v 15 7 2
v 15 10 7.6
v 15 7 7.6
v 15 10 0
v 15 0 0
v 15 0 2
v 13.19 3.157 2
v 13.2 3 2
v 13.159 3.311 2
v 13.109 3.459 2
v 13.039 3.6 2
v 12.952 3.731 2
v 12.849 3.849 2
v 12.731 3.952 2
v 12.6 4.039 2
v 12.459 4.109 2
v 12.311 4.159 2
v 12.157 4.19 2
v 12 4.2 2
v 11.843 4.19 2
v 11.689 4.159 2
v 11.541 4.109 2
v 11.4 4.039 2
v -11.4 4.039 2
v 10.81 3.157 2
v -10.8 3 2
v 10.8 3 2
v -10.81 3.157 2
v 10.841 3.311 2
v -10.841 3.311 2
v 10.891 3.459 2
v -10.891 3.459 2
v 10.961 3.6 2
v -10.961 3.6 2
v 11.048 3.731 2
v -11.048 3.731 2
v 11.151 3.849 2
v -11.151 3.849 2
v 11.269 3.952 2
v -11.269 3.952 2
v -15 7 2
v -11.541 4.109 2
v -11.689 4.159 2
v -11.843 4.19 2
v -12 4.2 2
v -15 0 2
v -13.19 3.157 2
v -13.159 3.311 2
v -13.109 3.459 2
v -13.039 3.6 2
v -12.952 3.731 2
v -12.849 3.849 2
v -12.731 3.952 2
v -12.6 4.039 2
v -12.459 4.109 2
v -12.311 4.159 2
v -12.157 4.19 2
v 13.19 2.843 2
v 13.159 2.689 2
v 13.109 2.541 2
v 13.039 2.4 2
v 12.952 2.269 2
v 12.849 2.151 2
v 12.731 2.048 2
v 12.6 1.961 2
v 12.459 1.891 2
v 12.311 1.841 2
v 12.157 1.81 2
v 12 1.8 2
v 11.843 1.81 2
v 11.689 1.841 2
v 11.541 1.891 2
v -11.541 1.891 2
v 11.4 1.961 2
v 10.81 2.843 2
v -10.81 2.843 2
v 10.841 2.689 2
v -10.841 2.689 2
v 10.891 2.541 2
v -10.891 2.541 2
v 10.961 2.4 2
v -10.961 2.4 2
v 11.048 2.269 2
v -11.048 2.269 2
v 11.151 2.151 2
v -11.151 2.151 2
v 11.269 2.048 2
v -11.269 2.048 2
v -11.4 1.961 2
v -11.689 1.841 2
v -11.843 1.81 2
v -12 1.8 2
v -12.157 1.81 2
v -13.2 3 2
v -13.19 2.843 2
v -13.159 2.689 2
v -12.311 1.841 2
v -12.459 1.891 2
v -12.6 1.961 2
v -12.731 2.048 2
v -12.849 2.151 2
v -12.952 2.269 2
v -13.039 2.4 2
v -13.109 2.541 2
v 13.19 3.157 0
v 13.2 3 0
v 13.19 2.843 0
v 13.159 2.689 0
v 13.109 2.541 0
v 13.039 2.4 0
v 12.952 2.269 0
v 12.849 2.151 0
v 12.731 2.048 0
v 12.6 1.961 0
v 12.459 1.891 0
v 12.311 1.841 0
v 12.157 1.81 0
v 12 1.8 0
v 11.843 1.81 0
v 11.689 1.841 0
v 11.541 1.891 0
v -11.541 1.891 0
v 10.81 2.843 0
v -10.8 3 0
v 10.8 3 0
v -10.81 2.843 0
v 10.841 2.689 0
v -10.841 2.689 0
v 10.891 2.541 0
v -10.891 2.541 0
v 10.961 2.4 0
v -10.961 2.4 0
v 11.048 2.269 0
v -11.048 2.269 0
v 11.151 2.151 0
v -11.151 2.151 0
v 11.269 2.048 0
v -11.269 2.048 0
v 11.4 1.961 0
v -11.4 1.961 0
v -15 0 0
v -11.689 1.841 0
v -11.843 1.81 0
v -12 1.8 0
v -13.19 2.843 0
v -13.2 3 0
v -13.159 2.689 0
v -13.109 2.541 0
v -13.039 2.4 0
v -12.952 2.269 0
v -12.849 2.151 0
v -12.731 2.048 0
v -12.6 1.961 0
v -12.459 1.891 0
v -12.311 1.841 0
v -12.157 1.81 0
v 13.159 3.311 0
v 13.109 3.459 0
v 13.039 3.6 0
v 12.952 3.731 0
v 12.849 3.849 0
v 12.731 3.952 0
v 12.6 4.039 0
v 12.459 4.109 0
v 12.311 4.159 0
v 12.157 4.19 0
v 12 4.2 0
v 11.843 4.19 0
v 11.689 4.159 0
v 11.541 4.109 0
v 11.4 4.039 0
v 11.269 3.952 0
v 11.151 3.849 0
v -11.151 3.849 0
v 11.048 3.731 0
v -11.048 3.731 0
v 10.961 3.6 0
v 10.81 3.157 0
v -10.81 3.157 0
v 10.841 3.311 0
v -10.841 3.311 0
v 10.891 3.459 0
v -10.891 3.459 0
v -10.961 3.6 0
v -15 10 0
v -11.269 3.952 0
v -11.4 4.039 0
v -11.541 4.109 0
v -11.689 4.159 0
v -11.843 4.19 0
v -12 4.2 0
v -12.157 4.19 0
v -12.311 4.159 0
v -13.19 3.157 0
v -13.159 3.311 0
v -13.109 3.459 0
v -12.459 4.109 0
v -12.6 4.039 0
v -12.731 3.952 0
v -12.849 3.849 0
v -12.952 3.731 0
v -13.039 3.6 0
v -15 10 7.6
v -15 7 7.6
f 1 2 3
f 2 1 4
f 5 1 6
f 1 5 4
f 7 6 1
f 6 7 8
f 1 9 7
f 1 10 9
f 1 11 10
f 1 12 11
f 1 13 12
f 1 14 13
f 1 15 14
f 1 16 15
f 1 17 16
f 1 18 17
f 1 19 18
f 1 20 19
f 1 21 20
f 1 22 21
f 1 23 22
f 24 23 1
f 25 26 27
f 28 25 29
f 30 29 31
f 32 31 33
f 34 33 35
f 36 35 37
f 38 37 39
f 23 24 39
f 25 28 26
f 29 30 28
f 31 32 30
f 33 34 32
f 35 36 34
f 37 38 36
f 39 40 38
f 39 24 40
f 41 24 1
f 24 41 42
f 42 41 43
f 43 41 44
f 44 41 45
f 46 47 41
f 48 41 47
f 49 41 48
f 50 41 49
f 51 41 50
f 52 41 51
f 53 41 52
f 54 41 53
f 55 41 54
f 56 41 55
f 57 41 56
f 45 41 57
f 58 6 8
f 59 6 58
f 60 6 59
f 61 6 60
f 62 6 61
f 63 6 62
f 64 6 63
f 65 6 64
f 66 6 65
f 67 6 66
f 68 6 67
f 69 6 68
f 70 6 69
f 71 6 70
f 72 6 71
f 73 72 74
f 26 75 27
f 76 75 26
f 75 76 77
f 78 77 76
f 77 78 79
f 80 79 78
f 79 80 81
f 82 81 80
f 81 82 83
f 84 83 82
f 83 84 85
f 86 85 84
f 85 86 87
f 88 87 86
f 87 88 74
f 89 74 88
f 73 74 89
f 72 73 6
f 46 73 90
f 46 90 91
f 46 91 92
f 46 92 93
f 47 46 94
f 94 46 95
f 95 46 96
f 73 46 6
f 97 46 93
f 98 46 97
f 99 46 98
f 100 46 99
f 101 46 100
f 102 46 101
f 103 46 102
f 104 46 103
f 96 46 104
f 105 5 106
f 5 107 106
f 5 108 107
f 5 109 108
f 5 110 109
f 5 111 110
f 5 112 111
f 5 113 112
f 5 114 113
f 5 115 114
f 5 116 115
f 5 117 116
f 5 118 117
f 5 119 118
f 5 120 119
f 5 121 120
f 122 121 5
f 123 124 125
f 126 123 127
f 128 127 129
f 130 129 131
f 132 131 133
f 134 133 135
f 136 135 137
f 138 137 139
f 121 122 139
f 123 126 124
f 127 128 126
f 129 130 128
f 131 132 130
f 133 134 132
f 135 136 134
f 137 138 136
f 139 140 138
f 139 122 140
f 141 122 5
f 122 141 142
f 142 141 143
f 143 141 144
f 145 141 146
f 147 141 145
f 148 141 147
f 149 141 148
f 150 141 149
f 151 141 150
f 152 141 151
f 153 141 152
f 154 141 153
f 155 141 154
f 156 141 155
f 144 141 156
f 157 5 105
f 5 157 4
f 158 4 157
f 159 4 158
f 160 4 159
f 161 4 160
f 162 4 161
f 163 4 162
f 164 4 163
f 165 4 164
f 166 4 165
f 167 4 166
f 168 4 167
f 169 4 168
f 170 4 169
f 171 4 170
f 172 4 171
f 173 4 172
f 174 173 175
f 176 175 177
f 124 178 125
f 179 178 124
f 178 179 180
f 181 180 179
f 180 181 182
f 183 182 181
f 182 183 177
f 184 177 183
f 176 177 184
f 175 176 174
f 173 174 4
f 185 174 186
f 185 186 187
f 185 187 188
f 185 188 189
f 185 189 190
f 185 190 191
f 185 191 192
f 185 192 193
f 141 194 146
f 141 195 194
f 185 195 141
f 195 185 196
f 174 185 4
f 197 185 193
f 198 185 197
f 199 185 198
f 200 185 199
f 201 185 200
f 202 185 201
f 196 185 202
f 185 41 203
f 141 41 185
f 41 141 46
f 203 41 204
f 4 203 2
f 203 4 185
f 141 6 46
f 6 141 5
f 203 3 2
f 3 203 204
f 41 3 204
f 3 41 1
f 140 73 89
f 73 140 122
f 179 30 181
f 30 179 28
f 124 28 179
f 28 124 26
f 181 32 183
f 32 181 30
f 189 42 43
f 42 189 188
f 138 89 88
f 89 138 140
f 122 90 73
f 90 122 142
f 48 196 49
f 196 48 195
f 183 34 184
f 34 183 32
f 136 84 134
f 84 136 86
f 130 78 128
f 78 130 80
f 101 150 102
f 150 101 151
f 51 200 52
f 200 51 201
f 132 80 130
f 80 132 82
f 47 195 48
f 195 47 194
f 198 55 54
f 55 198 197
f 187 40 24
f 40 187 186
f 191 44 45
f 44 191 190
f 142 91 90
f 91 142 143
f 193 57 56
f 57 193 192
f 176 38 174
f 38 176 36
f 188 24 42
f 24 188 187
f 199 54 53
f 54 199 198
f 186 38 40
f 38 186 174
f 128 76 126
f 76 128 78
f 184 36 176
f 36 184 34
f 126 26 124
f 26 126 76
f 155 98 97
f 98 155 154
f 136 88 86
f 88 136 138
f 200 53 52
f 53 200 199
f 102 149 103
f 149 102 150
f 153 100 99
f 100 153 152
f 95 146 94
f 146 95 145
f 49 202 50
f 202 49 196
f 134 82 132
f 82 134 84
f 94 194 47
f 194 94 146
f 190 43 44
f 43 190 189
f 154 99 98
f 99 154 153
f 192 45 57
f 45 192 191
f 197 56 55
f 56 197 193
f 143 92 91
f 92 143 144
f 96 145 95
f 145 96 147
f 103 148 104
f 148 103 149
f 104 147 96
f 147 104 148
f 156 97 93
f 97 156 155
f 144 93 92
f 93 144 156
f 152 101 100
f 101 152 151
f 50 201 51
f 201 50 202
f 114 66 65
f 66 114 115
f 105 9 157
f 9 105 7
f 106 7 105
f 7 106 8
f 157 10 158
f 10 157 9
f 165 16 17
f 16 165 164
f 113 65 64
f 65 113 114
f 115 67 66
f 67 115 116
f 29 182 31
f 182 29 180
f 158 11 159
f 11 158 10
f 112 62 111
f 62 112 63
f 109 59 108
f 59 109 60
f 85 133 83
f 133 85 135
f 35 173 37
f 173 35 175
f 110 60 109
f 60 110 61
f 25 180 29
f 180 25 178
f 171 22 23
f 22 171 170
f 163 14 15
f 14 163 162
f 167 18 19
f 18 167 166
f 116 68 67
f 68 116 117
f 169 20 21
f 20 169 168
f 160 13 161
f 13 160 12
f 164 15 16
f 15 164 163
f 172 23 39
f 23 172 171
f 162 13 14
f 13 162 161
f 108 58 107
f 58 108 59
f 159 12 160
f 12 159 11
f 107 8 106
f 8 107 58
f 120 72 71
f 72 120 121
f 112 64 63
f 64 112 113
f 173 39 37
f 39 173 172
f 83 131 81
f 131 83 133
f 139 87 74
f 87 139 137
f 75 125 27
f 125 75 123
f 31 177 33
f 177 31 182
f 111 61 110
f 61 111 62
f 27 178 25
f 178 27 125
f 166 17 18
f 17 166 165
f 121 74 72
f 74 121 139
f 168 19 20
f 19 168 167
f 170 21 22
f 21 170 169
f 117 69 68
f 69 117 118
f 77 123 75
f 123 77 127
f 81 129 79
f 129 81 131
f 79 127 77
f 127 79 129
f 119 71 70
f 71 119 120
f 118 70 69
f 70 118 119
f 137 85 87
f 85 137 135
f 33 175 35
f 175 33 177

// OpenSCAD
// file: params.scad
/*
 * params.scad — every dimension the printed parts share, in millimetres.
 * ======================================================================
 * Included by all cad/*.scad files. No dimension may be duplicated in a part
 * file; if two parts need the same number, it lives here.
 *
 * Values marked MEASURE are design targets until caliper measurements of a real
 * X240 top section replace them (issue #44). Everything else is a design choice.
 */

// ---------------------------------------------------------------- deck / case
case_width  = 309.0;   // MEASURE  X, left to right, at the deck's mating surface
case_depth  = 210.0;   // MEASURE  Y, front (palmrest) to back
wall_t      = 2.5;     // PETG shell wall
corner_r    = 3.0;     // MEASURE  outer corner radius
internal_h  = 18.0;    // floor-to-deck clearance (see docs/enclosure/integration.md)
case_h      = internal_h + wall_t;

// Screw bosses that meet the X240 deck, from the front-left corner.  MEASURE all.
deck_boss_positions = [
    [  8.0,   8.0 ], [ 60.0,   8.0 ], [150.0,   8.0 ], [250.0,   8.0 ], [301.0,   8.0 ],
    [  8.0, 202.0 ], [150.0, 202.0 ], [301.0, 202.0 ],
];
boss_od = 6.0;
boss_id = 3.2;         // M2 heat-set insert hole (insert OD ~3.2 for a 3.5 mm body)

// ---------------------------------------------------------------- split joint
split      = true;     // print as two halves (fits a 220 mm bed); false = one piece
split_x    = case_width / 2;
tab_count  = 3;        // dovetail tabs along the floor seam
tab_w      = 14.0;     // tab width at the seam
tab_flare  = 3.0;      // extra width at the tip (dovetail angle)
tab_len    = 10.0;     // how far the tab reaches into the other half
joint_gap  = 0.15;     // clearance per face; tune with a 30 mm coupon
pin_d      = 3.0;      // alignment pins through the front/rear walls
pin_len    = 10.0;

// ---------------------------------------------------------------- board / sled
board_w    = 100.0;    // stripboard or Rev B PCB
board_d    = 80.0;
board_hole_inset = 4.0;                  // M2 holes this far from each board corner
board_hole_d     = 2.4;
sled_margin      = 6.0;                  // sled extends this far past the board
sled_t           = 2.0;
sled_standoff_h  = 6.0;                  // board sits this high above the sled
sled_standoff_od = 5.0;
// sled centre in the case (rear-centre; see docs/enclosure/integration.md)
sled_center = [ case_width / 2, case_depth - 8 - board_d / 2 - sled_margin - 6 ];
// sled-to-case bosses (around the sled, two per half so the sled bridges the seam)
sled_boss_offsets = [ [-56, -46], [56, -46], [-56, 46], [56, 46] ];

// ---------------------------------------------------------------- Pico
pico_w = 51.0;
pico_d = 21.0;
pico_h = 1.0;          // PCB thickness
pico_hole_d = 2.1;     // Pico mounting holes, 11.4 x 47 mm pattern
pico_hole_dx = 47.0;
pico_hole_dy = 11.4;

// ---------------------------------------------------------------- USB
usb_c     = false;                     // false = Micro-USB cutout, true = USB-C
usb_w     = usb_c ? 9.5 : 8.5;
usb_h     = usb_c ? 4.0 : 3.5;
usb_x     = sled_center[0];            // cutout centred on the board
usb_z     = wall_t + sled_t + sled_standoff_h + 1.6;   // bottom of the Pico's connector
cable_d   = 4.5;                       // USB cable jacket diameter
relief_w  = 22.0;                      // strain-relief bezel footprint
relief_d  = 12.0;
relief_h  = 10.0;

// ---------------------------------------------------------------- FPC
fpc_w        = 22.0;   // 40-pin 0.5 mm cable width
fpc_t        = 0.3;
fpc_min_r    = 5.0;    // minimum bend radius
clickpad_fpc_w = 8.0;  // MEASURE  ClickPad cable width
zif_body_w   = 26.0;   // 40-pin ZIF connector body length along the cable edge
zif_body_d   = 6.0;
zif_body_h   = 5.0;
zif_cp_body_w = 12.0;  // ClickPad ZIF body (pin count from probing)

// ---------------------------------------------------------------- gasket, vents, feet
gasket_depth = 1.2;
gasket_width = 2.0;
vents        = false;  // not thermally needed (docs/enclosure/durability.md)
vent_w = 40.0; vent_h = 2.0; vent_count = 4; vent_spacing = 6.0;
ribs         = true;   // two front-to-back stiffening ribs in the floor
rib_t        = 2.0;
rib_h        = 4.0;

foot_d       = 10.0;   // rubber feet, front
foot_recess  = 1.0;
foot_positions = [ [25, 20], [case_width - 25, 20] ];
tilt_positions = [ [25, case_depth - 20], [case_width - 25, case_depth - 20] ];
tilt_h       = 12.0;   // rear riser height
tilt_w       = 30.0;
tilt_d       = 20.0;
tilt_screw_d = 3.4;    // M3 clearance

// ---------------------------------------------------------------- LED light pipe
pipe_d       = 3.0;
pipe_flange_d= 5.0;
pipe_len     = internal_h - 2;
pipe_position = [ sled_center[0] + board_w / 2 + 15, sled_center[1] - 20 ];  // beside the touchpad

// ---------------------------------------------------------------- printing
fit      = 0.2;        // general hole clearance for printed-in-place fits
$fn      = 48;
// main file
/*
 * zif_support_block.scad — backs up an FPC ZIF connector against insertion force
 * =============================================================================
 * A 0.5 mm pitch ZIF on a breakout or PCB lifts its pads when a cable is pushed
 * in at an angle.  This block sits under the connector's overhanging edge and
 * screws to the sled, so the push goes into plastic.
 *
 *   variant = "keyboard" (40-pin) | "clickpad"
 */
include <params.scad>

variant = "keyboard";
blk_w = (variant == "keyboard") ? zif_body_w + 4 : zif_cp_body_w + 4;
blk_d = zif_body_d + 4;
blk_h = sled_standoff_h + 1.6;   // reaches the underside of the connector through the board edge

module zif_block() {
    difference() {
        union() {
            translate([-blk_w / 2, 0, 0]) cube([blk_w, blk_d, sled_t]);            // foot on the sled
            translate([-blk_w / 2, blk_d - 3, 0]) cube([blk_w, 3, blk_h]);         // upright under the connector lip
        }
        for (x = [-blk_w / 2 + 3, blk_w / 2 - 3]) translate([x, 3, -1]) cylinder(h = sled_t + 2, d = 2.4);
    }
}

zif_block();
